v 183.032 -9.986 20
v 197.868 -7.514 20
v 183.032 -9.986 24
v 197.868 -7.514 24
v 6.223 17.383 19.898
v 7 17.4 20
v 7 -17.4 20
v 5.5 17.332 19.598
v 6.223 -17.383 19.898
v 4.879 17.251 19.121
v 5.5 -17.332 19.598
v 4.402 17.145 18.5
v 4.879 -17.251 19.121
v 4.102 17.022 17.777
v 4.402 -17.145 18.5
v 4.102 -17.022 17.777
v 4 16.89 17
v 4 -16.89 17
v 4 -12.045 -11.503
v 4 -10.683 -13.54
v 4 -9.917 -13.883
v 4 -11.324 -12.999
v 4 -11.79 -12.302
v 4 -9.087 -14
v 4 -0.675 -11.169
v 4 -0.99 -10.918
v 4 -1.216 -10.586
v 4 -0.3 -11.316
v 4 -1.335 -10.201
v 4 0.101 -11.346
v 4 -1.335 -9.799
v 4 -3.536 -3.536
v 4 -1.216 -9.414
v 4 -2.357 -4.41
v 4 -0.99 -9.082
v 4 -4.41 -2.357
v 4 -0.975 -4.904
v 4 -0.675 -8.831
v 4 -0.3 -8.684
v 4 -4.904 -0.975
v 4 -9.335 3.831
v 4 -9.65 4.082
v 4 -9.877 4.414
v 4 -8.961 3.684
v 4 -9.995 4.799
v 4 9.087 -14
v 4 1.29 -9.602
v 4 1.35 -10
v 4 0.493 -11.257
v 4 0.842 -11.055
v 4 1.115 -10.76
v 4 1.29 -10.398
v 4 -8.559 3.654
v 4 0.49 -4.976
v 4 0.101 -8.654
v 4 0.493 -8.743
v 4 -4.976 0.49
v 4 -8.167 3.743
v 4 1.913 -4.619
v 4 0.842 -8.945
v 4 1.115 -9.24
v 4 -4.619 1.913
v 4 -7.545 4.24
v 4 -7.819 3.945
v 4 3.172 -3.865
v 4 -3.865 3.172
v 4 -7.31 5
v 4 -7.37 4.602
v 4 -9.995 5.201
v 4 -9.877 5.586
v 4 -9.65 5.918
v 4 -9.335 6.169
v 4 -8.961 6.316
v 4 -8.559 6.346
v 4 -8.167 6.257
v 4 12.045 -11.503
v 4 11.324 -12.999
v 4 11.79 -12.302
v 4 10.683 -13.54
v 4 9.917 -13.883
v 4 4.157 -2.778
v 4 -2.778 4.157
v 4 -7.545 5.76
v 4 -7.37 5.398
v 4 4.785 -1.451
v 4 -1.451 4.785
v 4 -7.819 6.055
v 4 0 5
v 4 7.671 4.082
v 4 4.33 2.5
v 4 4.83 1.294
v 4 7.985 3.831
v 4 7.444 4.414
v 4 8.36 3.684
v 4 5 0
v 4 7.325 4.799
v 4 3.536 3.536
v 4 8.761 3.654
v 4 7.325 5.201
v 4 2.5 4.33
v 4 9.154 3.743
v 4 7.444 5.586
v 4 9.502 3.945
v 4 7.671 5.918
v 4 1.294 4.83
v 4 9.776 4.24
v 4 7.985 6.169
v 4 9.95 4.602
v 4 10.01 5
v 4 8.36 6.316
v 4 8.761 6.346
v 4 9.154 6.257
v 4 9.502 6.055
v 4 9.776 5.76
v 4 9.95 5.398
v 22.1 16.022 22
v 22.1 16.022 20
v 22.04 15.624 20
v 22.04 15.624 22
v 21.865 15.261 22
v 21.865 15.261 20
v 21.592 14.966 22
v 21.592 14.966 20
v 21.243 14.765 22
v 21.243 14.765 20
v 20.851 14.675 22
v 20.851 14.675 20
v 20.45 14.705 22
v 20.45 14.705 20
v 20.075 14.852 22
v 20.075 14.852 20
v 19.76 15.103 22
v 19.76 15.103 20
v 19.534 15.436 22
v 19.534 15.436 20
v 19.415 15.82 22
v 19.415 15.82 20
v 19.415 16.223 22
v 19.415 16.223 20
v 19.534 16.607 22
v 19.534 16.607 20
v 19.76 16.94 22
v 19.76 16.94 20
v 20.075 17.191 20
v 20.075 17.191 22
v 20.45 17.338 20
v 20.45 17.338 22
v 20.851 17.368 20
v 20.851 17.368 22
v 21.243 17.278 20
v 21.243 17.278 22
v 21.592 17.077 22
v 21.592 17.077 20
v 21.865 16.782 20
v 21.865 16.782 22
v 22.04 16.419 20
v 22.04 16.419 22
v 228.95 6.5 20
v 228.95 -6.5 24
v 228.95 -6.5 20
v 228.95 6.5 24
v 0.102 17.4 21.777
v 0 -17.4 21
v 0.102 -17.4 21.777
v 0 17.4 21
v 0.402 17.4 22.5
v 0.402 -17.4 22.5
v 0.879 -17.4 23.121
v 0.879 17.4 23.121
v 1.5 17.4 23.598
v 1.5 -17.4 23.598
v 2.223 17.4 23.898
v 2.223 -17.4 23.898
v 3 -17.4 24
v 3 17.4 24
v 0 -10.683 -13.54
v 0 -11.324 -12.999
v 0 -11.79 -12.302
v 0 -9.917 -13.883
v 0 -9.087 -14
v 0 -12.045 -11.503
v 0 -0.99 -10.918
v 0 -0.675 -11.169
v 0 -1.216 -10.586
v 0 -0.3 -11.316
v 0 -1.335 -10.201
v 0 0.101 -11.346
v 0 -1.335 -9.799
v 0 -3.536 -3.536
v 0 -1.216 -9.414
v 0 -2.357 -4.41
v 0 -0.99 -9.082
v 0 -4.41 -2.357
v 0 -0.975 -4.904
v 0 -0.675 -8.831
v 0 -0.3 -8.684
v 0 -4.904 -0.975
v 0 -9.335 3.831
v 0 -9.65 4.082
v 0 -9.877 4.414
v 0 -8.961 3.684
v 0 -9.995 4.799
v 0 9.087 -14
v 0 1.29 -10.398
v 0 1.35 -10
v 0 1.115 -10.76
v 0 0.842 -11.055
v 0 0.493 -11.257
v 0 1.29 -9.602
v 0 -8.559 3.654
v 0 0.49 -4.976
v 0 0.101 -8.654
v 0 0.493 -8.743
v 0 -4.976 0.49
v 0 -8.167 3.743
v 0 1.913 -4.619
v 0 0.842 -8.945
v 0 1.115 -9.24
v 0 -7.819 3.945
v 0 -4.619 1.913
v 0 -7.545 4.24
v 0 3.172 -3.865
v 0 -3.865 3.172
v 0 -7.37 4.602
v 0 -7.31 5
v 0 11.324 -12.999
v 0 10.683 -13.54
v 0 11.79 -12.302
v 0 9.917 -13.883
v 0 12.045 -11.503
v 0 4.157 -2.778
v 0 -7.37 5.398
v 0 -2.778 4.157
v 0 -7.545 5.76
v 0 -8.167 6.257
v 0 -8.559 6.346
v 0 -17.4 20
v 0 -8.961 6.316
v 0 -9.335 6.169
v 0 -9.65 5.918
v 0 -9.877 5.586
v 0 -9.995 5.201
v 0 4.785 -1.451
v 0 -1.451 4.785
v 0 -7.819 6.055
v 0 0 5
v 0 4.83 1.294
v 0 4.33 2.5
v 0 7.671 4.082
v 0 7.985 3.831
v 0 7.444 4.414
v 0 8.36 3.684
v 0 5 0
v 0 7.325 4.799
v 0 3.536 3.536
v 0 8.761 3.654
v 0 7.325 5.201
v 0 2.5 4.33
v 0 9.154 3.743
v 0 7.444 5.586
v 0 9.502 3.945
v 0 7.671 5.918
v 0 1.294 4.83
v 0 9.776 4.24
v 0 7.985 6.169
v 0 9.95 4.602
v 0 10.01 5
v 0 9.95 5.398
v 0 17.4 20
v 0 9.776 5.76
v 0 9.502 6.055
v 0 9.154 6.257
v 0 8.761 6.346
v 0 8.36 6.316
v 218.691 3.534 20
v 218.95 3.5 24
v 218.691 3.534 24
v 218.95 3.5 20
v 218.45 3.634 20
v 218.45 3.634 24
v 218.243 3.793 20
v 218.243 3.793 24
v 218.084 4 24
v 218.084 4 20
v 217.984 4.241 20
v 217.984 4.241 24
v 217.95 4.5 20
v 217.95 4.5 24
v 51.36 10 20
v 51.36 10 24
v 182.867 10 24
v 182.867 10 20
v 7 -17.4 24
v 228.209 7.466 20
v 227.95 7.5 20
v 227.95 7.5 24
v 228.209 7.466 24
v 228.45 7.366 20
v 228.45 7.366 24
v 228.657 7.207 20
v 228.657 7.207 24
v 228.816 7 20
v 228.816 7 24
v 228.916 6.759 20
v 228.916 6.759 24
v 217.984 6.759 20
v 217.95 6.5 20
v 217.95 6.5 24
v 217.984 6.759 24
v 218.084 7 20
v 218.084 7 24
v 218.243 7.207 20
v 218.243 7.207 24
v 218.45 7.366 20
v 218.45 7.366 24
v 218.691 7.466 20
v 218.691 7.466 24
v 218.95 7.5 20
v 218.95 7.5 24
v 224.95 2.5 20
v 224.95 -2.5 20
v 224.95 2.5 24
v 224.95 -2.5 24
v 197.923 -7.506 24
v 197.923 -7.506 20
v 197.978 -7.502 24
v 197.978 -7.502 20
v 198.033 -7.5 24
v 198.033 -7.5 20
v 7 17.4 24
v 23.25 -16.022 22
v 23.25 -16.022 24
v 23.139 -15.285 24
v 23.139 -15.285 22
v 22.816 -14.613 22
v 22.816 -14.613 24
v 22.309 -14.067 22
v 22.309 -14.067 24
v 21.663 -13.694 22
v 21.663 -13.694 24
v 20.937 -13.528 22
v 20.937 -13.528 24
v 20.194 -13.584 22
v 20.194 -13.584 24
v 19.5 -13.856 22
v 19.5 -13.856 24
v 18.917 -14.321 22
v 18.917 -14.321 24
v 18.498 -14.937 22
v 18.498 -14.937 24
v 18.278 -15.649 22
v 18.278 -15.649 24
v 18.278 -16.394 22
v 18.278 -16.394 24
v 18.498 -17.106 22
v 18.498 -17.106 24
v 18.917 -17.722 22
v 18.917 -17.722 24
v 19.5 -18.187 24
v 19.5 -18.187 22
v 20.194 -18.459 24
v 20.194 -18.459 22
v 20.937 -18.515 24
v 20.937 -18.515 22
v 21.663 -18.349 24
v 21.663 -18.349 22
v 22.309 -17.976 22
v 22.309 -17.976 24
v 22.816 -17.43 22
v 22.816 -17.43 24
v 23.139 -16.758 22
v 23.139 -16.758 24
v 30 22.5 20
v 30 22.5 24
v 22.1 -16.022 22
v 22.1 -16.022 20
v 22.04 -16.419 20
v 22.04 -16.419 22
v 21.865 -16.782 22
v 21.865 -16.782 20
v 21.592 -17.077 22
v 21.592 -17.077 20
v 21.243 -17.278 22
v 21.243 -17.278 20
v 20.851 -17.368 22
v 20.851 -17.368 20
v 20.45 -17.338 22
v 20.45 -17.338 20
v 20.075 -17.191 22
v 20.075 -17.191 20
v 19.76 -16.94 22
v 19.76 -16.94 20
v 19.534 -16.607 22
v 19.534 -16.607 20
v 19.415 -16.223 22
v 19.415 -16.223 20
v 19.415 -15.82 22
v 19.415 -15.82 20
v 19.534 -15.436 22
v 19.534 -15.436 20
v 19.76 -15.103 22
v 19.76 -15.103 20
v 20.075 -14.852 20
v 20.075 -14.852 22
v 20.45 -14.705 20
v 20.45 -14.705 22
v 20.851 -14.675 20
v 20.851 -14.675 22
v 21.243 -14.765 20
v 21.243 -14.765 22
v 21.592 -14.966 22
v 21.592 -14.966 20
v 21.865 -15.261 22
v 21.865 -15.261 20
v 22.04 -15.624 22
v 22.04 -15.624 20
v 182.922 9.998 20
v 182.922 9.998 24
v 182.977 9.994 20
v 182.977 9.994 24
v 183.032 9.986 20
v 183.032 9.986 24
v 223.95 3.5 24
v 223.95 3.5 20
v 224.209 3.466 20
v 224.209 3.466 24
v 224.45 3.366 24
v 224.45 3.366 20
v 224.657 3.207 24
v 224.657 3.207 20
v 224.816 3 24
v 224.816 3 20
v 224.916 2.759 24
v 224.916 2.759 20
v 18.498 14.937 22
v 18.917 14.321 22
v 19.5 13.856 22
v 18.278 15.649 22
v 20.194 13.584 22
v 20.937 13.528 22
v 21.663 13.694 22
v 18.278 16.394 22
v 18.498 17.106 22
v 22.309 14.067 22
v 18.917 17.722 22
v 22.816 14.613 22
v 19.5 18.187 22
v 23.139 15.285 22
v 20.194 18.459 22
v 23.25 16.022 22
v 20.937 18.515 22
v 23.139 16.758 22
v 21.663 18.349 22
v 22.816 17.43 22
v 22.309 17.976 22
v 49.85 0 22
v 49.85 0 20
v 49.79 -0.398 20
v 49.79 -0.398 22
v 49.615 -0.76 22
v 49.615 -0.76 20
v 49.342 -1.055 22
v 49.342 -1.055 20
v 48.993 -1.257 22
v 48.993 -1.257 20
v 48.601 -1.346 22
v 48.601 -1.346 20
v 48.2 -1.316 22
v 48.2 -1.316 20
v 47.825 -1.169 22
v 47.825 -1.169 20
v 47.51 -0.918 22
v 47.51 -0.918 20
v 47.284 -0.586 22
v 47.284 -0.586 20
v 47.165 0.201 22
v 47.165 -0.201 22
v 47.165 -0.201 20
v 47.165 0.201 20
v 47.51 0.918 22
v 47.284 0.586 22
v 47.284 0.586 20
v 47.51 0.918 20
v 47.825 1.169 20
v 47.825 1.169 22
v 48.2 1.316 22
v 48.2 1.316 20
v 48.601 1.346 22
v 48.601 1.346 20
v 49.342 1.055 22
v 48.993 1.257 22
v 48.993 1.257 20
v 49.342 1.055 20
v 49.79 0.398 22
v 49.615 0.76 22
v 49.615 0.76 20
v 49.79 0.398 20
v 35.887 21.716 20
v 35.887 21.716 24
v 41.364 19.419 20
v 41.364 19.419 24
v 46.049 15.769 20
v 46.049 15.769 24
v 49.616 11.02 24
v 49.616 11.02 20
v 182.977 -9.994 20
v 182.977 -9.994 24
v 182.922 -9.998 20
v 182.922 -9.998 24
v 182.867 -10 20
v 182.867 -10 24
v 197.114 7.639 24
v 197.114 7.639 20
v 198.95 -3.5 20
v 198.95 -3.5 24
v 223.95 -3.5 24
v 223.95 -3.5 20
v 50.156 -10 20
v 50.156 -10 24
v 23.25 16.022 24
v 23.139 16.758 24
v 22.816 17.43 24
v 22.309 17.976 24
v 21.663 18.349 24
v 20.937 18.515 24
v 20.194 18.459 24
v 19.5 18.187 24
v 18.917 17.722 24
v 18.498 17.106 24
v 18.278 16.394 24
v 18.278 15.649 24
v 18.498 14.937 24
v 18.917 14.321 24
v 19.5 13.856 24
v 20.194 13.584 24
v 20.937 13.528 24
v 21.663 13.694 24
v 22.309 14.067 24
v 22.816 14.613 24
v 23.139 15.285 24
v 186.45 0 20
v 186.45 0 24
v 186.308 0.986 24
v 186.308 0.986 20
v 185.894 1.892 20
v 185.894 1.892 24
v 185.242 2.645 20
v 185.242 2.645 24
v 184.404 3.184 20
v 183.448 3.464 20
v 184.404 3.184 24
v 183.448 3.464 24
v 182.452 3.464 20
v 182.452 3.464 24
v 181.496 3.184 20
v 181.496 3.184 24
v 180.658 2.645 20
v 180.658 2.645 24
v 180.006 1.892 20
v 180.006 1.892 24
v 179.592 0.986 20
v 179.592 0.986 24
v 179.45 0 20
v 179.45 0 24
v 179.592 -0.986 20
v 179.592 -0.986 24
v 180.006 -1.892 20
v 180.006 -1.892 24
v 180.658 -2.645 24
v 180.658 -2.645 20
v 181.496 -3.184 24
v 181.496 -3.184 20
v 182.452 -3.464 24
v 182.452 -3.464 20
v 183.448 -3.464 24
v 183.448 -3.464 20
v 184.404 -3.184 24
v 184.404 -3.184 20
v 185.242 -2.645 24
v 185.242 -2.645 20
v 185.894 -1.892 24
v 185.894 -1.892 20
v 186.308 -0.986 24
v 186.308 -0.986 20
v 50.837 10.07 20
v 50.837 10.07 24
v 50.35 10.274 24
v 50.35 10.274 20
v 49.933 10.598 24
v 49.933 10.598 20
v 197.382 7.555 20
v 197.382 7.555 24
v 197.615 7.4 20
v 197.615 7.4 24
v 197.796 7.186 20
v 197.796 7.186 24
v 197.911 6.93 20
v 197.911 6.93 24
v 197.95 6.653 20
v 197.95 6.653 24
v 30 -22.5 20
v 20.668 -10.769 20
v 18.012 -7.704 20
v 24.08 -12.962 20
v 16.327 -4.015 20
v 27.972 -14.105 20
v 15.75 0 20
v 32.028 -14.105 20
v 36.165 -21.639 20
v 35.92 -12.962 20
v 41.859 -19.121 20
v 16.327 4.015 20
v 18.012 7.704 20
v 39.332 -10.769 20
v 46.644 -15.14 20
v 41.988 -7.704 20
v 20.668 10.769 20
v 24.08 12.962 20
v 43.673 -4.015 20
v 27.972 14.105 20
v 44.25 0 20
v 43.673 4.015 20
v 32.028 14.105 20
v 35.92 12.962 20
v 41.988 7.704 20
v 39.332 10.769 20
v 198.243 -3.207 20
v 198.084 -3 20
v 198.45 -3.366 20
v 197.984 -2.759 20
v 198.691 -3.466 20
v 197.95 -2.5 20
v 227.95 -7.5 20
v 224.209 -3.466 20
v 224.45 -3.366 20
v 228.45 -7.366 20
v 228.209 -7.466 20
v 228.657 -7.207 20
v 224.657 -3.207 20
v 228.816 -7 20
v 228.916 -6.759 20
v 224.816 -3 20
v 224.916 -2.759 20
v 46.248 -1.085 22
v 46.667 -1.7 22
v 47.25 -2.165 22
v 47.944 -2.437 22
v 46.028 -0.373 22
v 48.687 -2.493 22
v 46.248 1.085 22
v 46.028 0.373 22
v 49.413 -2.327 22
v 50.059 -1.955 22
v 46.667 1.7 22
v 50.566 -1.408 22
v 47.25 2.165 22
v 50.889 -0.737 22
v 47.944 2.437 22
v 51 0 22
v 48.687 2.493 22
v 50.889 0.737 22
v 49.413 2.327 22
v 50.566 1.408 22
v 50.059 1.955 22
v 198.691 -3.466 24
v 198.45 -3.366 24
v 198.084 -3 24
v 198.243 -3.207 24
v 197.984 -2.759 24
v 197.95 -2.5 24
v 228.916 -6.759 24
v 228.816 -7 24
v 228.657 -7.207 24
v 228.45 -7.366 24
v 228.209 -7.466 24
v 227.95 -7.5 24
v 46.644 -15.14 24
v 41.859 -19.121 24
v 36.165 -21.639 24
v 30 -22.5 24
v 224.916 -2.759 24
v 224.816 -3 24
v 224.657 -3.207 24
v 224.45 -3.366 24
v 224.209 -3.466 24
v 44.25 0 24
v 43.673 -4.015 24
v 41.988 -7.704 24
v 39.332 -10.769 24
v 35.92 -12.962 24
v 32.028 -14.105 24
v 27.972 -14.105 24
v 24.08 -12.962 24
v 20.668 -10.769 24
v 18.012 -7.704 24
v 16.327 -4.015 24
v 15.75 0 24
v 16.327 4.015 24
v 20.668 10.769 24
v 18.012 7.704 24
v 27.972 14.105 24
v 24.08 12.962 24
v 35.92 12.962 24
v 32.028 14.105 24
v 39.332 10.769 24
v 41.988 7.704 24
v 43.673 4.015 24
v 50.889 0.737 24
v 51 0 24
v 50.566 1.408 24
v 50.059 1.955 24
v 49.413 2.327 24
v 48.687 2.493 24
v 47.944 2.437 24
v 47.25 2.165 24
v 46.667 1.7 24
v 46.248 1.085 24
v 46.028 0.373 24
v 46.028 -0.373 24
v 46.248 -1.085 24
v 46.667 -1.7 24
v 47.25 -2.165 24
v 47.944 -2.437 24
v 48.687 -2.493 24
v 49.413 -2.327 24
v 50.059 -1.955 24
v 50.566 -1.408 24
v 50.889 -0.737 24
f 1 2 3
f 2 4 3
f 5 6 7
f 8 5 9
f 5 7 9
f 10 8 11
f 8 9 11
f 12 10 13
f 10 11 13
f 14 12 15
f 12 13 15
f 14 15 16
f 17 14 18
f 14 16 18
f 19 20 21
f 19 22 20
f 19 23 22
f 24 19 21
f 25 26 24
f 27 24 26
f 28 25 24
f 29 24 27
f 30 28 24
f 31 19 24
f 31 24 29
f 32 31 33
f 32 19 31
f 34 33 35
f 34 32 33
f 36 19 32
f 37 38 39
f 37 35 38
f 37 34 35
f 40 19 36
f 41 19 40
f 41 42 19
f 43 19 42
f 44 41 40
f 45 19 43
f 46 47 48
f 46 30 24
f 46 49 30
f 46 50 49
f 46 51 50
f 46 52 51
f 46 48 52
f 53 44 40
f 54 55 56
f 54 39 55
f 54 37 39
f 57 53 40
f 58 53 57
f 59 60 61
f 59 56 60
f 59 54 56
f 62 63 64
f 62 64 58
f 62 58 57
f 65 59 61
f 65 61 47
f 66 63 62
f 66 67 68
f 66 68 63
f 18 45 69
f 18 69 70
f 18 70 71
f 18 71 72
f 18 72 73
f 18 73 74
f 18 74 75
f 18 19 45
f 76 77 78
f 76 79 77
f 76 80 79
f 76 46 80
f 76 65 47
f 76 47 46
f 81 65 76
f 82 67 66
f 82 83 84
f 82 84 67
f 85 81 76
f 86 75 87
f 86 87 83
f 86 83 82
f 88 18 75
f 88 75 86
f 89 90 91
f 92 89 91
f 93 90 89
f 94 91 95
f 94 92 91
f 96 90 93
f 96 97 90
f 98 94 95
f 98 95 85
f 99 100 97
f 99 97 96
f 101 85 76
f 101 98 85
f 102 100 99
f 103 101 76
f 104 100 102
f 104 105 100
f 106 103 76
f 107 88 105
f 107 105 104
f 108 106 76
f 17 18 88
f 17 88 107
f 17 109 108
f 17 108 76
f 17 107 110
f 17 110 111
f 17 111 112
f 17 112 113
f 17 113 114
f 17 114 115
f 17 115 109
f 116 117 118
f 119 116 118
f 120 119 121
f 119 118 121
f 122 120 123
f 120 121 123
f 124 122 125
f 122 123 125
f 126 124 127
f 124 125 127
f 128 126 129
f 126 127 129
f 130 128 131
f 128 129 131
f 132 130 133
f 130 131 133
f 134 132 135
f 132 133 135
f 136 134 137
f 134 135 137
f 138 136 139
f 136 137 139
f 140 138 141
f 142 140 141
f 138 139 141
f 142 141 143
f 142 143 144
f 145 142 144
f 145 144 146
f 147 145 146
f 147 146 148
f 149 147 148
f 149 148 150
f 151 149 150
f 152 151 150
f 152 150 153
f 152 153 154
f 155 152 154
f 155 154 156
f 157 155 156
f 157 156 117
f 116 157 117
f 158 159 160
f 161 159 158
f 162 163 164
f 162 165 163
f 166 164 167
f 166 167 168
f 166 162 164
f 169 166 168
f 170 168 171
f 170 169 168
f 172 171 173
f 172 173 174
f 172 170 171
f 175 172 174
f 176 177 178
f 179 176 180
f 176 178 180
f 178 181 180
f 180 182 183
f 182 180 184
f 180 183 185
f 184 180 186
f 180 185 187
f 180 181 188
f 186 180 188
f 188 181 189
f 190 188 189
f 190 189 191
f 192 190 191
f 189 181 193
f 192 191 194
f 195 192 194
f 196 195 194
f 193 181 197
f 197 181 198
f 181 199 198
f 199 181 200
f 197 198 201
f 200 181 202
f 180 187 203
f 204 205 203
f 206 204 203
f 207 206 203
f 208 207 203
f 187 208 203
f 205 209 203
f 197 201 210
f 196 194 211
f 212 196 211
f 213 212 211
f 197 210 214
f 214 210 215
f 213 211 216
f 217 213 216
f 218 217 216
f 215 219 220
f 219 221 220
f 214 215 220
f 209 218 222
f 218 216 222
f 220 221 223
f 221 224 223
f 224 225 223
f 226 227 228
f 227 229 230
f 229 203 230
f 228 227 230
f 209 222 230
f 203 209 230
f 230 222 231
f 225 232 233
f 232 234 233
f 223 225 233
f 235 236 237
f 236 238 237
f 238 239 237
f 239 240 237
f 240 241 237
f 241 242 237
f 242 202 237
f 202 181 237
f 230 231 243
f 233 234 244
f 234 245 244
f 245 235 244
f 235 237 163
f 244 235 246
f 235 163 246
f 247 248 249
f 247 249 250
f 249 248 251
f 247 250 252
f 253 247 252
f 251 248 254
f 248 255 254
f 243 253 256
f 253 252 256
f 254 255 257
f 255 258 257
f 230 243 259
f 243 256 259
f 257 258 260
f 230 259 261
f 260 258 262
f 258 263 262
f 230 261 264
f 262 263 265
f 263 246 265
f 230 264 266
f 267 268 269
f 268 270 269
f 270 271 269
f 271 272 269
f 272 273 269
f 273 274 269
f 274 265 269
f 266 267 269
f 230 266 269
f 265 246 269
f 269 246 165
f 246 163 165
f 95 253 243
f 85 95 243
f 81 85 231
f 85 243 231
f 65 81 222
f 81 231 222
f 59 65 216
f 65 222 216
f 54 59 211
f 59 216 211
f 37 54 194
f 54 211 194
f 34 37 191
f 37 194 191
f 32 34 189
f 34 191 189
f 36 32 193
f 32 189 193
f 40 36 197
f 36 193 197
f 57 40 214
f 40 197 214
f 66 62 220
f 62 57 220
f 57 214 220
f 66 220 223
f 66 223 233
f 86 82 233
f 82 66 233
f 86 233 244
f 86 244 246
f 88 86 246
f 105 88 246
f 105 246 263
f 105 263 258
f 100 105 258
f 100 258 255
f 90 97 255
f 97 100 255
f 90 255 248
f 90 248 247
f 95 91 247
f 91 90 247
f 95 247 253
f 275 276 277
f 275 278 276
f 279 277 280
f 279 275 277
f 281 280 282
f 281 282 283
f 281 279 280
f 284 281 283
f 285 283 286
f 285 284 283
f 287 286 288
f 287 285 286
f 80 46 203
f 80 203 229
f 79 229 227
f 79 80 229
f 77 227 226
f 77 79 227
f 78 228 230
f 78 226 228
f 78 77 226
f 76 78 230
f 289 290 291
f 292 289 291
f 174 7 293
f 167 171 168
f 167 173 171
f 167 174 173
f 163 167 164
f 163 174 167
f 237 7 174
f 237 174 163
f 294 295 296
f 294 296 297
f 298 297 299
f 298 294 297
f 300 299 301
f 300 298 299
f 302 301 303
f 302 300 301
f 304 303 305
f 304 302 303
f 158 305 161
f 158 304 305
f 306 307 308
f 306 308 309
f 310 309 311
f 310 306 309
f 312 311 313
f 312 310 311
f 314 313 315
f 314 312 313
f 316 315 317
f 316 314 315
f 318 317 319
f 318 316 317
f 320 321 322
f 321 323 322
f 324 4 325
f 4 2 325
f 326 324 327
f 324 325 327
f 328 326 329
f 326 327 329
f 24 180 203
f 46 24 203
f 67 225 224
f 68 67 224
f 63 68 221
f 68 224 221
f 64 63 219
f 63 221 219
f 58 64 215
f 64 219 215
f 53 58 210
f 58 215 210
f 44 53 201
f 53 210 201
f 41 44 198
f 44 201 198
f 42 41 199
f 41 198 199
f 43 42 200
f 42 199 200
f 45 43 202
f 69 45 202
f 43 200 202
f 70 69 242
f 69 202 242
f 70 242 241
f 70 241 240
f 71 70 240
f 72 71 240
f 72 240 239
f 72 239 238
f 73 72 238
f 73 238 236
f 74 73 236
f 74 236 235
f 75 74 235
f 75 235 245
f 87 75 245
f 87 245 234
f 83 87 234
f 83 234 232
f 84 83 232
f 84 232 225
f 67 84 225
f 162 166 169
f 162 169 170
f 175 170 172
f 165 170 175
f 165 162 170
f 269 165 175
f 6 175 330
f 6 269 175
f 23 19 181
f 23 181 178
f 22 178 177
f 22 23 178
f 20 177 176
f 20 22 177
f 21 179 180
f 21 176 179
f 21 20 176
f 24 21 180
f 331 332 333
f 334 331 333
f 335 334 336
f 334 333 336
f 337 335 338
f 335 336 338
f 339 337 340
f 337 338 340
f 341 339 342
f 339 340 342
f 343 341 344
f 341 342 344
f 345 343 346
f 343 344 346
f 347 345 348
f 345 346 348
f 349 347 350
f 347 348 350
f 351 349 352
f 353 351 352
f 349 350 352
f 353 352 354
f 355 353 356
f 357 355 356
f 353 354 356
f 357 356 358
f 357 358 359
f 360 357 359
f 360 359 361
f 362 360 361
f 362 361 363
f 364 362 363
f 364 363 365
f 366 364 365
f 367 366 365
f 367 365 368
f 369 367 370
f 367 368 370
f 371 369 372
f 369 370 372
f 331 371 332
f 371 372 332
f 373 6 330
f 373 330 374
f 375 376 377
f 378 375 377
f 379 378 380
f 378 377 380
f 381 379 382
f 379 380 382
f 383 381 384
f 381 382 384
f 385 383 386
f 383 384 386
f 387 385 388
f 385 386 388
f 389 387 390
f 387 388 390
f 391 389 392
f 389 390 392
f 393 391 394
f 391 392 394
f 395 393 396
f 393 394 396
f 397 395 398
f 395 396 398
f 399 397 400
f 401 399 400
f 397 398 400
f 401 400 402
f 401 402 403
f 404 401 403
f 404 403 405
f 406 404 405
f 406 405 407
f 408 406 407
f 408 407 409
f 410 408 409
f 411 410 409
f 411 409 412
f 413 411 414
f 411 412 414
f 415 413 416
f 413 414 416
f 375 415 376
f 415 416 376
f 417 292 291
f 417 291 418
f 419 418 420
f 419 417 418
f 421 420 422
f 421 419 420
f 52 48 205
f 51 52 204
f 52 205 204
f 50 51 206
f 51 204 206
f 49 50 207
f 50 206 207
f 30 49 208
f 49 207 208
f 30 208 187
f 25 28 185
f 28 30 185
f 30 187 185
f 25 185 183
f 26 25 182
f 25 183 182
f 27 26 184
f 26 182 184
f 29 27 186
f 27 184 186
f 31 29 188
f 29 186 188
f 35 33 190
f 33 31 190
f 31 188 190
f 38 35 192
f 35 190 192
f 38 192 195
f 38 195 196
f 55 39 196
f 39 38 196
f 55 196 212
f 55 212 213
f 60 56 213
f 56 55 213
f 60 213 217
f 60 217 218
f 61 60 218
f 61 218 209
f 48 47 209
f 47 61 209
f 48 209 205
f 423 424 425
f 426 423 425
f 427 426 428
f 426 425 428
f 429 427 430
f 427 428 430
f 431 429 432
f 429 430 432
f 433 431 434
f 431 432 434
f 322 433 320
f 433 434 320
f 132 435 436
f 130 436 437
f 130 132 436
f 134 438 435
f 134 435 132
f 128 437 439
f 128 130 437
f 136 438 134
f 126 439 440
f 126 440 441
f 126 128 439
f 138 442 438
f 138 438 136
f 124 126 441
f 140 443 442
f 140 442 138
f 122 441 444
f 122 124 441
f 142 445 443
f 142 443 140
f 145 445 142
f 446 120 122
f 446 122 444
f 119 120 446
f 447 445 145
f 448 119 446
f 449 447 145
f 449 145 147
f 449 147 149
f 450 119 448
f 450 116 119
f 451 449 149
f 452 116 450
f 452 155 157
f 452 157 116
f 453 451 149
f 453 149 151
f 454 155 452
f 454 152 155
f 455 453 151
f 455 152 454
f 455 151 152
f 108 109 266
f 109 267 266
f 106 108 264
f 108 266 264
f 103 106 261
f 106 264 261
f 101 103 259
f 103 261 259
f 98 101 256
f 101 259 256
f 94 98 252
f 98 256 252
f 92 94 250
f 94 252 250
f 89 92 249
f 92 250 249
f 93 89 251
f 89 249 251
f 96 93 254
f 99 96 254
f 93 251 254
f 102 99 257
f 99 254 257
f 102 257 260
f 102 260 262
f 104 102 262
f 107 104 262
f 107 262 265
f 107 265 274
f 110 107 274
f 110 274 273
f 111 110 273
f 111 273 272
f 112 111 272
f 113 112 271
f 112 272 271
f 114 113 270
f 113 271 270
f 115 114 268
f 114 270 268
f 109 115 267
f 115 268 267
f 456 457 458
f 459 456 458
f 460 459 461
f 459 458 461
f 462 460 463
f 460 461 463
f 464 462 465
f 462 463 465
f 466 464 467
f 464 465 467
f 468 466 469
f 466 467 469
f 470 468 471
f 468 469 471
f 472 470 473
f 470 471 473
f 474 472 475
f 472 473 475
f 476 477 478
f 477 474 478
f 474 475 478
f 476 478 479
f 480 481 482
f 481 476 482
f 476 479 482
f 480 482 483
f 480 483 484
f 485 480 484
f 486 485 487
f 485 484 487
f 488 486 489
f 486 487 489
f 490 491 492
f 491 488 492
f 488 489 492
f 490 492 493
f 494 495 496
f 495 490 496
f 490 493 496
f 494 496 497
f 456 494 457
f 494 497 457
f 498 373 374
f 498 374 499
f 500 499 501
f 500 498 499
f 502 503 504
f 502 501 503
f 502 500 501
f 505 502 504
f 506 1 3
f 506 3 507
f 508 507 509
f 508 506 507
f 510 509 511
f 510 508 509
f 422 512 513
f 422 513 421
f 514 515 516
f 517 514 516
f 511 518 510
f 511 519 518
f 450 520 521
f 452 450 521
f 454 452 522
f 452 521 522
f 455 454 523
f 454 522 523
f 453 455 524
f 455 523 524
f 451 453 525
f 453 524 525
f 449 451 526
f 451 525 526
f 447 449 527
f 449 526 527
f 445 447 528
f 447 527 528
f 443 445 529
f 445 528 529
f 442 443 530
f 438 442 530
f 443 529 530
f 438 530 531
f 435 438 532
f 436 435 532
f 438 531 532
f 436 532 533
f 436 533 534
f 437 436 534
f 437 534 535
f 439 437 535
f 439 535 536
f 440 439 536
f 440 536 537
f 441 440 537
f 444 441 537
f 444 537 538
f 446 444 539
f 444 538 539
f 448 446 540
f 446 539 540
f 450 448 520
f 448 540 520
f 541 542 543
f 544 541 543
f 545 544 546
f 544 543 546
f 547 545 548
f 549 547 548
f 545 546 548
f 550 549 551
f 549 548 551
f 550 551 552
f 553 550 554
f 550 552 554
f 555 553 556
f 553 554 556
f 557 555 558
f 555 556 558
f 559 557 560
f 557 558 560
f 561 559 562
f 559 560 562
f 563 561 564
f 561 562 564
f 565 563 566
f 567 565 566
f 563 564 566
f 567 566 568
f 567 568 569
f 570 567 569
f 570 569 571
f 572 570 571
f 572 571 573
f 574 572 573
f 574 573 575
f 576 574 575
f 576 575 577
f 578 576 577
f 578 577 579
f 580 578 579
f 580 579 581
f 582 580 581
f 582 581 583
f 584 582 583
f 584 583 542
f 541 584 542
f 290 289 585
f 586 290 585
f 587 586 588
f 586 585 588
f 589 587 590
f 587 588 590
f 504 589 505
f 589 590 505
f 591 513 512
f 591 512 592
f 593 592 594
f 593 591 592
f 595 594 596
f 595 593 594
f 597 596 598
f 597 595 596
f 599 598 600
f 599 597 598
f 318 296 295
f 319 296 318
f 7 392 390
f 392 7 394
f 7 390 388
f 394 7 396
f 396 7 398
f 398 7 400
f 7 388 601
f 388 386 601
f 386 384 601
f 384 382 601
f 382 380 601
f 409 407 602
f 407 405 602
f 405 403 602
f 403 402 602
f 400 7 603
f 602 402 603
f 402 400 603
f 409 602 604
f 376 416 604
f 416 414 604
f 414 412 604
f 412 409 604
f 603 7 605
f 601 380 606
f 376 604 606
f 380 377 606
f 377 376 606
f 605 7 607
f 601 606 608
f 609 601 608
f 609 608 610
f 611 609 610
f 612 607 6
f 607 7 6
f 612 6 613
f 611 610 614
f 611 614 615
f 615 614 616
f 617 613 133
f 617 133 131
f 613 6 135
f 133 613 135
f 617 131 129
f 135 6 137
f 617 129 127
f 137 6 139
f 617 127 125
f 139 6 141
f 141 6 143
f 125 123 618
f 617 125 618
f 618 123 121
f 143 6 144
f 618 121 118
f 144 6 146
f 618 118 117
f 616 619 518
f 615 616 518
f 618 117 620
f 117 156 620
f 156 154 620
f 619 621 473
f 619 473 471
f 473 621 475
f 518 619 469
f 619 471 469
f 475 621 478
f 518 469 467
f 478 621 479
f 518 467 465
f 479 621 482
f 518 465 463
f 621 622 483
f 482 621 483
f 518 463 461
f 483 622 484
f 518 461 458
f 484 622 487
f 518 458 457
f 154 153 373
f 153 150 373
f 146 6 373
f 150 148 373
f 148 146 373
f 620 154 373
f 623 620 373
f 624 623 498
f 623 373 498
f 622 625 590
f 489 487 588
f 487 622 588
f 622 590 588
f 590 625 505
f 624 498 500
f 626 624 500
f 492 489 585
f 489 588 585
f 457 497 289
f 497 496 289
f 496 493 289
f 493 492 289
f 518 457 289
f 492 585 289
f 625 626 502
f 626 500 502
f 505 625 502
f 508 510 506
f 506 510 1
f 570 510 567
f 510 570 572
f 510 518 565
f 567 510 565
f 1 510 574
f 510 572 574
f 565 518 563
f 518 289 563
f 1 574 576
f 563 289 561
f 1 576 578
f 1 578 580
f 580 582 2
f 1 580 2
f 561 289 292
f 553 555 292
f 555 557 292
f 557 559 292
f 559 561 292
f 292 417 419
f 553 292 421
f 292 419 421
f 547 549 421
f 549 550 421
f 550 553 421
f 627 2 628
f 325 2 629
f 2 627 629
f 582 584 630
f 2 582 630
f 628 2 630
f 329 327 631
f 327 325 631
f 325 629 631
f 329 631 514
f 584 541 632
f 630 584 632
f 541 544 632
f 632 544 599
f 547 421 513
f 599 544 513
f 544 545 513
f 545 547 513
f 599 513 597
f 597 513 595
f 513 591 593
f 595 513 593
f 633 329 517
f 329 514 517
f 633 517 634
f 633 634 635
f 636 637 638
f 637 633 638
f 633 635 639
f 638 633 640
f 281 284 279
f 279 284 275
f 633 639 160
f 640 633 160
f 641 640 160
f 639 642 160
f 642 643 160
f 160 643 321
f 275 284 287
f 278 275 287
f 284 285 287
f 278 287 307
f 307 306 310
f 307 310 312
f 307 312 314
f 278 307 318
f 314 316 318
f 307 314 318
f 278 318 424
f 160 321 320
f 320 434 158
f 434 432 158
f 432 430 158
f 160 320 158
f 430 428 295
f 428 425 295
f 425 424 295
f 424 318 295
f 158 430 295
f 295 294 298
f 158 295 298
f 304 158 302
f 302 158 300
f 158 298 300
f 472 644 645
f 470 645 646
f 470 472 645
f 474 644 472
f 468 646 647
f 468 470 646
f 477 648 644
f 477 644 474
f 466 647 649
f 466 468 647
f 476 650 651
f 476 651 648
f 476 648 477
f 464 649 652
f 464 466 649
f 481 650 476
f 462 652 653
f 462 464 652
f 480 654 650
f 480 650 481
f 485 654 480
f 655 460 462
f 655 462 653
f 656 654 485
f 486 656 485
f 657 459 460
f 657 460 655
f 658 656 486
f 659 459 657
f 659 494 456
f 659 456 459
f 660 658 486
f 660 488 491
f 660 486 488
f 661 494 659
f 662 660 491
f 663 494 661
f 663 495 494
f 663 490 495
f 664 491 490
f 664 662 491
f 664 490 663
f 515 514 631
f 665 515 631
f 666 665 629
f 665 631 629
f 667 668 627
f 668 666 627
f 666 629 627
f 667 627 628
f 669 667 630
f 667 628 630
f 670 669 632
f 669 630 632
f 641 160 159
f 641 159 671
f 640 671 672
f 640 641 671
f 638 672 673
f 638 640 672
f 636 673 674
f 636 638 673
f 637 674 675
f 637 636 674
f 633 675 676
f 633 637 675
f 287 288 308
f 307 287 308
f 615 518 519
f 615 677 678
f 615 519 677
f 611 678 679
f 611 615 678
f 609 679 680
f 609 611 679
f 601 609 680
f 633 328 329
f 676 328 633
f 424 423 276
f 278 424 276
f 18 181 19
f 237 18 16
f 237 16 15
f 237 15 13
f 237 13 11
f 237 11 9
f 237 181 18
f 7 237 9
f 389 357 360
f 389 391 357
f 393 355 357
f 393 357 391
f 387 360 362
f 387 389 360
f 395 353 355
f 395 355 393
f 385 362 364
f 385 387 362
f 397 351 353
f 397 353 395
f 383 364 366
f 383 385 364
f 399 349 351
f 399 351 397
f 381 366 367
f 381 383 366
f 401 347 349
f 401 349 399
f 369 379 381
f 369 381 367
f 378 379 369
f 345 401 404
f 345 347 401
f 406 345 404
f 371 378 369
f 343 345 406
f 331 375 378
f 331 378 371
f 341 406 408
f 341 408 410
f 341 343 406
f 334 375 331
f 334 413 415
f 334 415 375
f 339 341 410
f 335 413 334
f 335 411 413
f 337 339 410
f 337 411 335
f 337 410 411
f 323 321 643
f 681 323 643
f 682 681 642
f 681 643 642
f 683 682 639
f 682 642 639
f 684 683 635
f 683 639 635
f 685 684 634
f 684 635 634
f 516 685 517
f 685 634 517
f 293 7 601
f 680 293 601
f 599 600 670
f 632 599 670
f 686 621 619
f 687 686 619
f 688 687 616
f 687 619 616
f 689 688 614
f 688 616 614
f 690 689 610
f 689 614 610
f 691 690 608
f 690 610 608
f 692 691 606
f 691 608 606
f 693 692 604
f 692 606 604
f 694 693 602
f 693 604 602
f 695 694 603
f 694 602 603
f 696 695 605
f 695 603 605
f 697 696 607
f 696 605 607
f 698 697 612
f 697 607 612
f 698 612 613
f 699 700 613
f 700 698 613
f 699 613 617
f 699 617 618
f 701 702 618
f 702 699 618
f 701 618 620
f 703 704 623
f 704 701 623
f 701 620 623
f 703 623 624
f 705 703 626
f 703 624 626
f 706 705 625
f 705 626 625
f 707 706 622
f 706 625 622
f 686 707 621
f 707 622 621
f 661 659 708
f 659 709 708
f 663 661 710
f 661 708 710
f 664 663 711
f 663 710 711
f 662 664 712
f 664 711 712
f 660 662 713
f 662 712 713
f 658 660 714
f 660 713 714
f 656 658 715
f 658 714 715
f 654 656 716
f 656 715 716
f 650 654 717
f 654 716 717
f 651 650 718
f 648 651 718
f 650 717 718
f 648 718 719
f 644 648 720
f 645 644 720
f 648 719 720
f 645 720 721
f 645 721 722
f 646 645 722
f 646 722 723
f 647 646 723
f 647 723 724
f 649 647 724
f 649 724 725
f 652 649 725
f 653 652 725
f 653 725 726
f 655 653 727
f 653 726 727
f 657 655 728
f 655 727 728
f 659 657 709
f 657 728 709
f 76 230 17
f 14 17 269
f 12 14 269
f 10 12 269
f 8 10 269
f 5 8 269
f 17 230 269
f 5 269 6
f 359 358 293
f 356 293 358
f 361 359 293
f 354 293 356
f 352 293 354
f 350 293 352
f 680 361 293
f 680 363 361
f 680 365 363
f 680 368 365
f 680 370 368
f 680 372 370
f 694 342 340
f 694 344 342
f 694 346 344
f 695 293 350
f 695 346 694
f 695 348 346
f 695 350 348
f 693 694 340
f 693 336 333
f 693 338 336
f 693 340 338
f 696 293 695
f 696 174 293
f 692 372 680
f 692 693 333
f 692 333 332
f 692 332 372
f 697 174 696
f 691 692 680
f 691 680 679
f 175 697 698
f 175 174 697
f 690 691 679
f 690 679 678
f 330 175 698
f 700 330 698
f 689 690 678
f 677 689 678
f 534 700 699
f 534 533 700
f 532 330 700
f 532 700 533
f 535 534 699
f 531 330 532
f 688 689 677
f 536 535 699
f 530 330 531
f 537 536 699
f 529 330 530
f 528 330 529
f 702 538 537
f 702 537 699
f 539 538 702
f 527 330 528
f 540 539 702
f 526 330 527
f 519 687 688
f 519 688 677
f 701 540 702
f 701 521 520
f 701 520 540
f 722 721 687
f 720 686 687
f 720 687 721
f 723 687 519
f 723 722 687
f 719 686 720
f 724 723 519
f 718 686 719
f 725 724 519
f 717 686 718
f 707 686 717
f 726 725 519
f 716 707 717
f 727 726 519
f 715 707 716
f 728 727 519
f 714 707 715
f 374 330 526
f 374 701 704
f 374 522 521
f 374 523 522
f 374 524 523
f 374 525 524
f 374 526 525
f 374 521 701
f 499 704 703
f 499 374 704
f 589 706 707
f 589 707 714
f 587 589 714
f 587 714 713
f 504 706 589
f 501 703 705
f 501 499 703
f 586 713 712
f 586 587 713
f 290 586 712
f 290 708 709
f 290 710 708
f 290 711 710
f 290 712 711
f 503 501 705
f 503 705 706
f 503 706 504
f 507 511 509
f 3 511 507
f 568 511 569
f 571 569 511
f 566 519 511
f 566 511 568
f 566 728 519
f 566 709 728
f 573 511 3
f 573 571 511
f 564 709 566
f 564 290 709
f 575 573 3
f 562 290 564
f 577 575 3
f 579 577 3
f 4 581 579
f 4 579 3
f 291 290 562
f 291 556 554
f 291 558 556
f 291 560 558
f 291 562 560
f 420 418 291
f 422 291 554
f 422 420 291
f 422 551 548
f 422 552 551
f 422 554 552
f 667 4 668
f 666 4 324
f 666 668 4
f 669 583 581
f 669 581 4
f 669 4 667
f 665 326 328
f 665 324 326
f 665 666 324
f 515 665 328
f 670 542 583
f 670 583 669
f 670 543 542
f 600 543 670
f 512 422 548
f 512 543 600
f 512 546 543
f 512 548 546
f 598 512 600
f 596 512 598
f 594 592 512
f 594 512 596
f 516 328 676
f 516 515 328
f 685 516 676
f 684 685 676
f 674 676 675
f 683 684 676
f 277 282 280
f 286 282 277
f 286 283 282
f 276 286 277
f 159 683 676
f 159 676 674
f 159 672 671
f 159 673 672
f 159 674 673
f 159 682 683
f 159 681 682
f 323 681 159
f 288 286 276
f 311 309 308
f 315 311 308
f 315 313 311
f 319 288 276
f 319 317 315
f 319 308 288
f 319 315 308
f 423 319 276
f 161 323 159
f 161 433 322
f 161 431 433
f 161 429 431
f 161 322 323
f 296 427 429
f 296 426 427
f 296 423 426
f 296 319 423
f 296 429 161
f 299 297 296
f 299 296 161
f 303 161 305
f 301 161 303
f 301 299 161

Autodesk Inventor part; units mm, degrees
ref_plane "YZ Plane" through (0, 0, 0) normal (1, 0, 0) x (0, 1, 0)
ref_plane "XZ Plane" through (0, 0, 0) normal (0, 1, 0) x (-1, 0, 0)
ref_plane "XY Plane" through (0, 0, 0) normal (0, 0, 1) x (1, 0, 0)
sketch "スケッチ1" plane through (0, 0, 0) normal (1, 0, 0) x (0, 1, 0)
  circle A0 centre (0, 0) radius 10
  circle A1 centre (0, -10) radius 1.35
  circle A2 centre (8.6603, 5) radius 1.35
  circle A3 centre (-8.6603, 5) radius 1.35
  circle A4 centre (0, 0) radius 5
  line L0 (0, 0) -> (0, 50)
  circle A5 centre (0, 50) radius 22.5
  circle A6 centre (0, 0) radius 14
  line L1 (-14, 0) -> (-22.5, 50)
  line L2 (14, 0) -> (22.5, 50)
  line L3 (0, -14) -> (-11.62, -14)
  line L4 (-11.62, -14) -> (-14, 0)
  line L5 (0, -14) -> (11.62, -14)
  line L6 (11.62, -14) -> (14, 0)
  line L7 (0, 20) -> (-17.4, 20)
  line L8 (0, 20) -> (17.4, 20)
  dimension "d0" = 20
  dimension "d1" = 2.7
  dimension "d4" = 360
  dimension "d6" = 10
  dimension "d7" = 50
  dimension "d8" = 45
  dimension "d9" = 28
extrude "押し出し1" add sketch "スケッチ1" along normal blind 4 contours A0 A1 A3 A2 | A6 L6 L4 | A6 L1 L7 L0 | L0 L8 L2 A6 | L6 L5 A6 | A6 L3 L4
sketch "スケッチ2" plane through (0, -17.4, 20) normal (0, 0, 1) x (1, 0, 0)
  line L0 (0, 17.4) -> (30, 17.4)
  circle A0 centre (30, 17.4) radius 22.5
  circle A1 centre (30, 17.4) radius 18.5
  circle A2 centre (30, 17.4) radius 14.25
  circle A3 centre (48.5, 17.4) radius 1.35
  circle A4 centre (20.75, 33.4215) radius 1.35
  circle A5 centre (20.75, 1.3785) radius 1.35
  line L1 (0, 29.02) -> (0, 34.8) projected
  line L2 (0, 0) -> (0, 5.78) projected
  line L3 (0, 34.8) -> (0, 0)
  line L4 (4, 29.02) -> (4, 34.8) projected
  line L5 (4, 34.8) -> (7, 34.8)
  line L6 (7, 34.8) -> (30, 39.9)
  line L7 (4, 0) -> (4, 5.78) projected
  line L8 (4, 0) -> (7, 0)
  line L9 (7, 0) -> (30, -5.1)
  line L10 (4, 0) -> (0, 0)
  line L11 (0, 34.8) -> (4, 34.8) projected
  line L12 (0, 0) -> (0, 34.8)
  line L13 (0, 34.8) -> (4, 34.8)
  dimension "d14" = 37
  dimension "d12" = 30
  dimension "d13" = 45
  dimension "d15" = 28.5
  dimension "d16" = 2.7
  dimension "d19" = 360
  dimension "d21" = 3
  dimension "d22" = 3
extrude "押し出し2" add sketch "スケッチ2" along normal blind 4 contours L3 L1 L11 L5 L6 A0 L0 | L0 A0 L9 L8 L10 L2 L3 | A1 A4 A3 A5 | A0 L6 L9
fillet "フィレット1" radius 3 2 edges at (4, 0, 20) (0, 0, 24)
fillet "フィレット2" radius 3 2 edges at (2, -11.62, -14) (2, 11.62, -14)
sketch "スケッチ7" plane through (0, -17.4, 24) normal (0, 0, 1) x (1, 0, 0)
  circle A0 centre (30, 17.4) radius 14.25 projected
  line L0 (30, 17.4) -> (182.95, 17.4)
  line L1 (30, 17.4) -> (182.95, 17.4) construction
  circle A1 centre (182.95, 17.4) radius 3.5
  circle A2 centre (182.95, 17.4) radius 10
  line L2 (182.95, 27.4) -> (50.1556, 27.4)
  arc A3 (30, -5.1) -> (30, 39.9) centre (30, 17.4) ccw projected
  line L3 (182.95, 27.4) -> (315.7444, 27.4) construction
  line L4 (182.95, 7.4) -> (50.1556, 7.4)
  point P0 (0, 17.4)
  dimension "d55" = 152.95
  dimension "d56" = 0
  dimension "d57" = 7
  dimension "d58" = 20
  dimension "d59" = 180
extrude "押し出し7" add sketch "スケッチ7" against normal blind 4 contours A3 L2 A2 L0 | L0 A2 L4 A3 | A2
sketch "スケッチ8" plane through (0, -17.4, 24) normal (0, 0, 1) x (1, 0, 0)
  circle A0 centre (20.75, 33.4215) radius 1.35 projected
  circle A1 centre (20.75, 33.4215) radius 2.5
  circle A2 centre (48.5, 17.4) radius 1.35 projected
  circle A3 centre (48.5, 17.4) radius 2.5
  circle A4 centre (20.75, 1.3785) radius 1.35 projected
  circle A5 centre (20.75, 1.3785) radius 2.5
  point P0 (0, 17.4)
  dimension "d63" = 5
  dimension "d64" = 5
  dimension "d65" = 5
extrude "押し出し8" cut sketch "スケッチ8" against normal blind 2 contours A0 | A1 | A3 | A4 | A5
fillet "フィレット4" radius 2 1 edges at (50.1556, 10, 22)
sketch "スケッチ12" plane through (0, -17.4, 24) normal (0, 0, 1) x (1, 0, 0)
  circle A0 centre (48.5, 17.4) radius 2.5 projected
  circle A1 centre (20.75, 1.3785) radius 2.5 projected
  circle A2 centre (20.75, 33.4215) radius 2.5 projected
  circle A3 centre (182.95, 17.4) radius 3.5 projected
  line L0 (3, 0) -> (3, 34.8) projected
  line L1 (3, 0) -> (7, 0) projected
  line L2 (7, 0) -> (30, -5.1) projected
  arc A4 (30, -5.1) -> (50.1556, 7.4) centre (30, 17.4) ccw projected
  line L3 (50.1556, 7.4) -> (182.95, 7.4) projected
  arc A5 (182.95, 7.4) -> (182.95, 27.4) centre (182.95, 17.4) ccw projected
  line L4 (182.95, 27.4) -> (51.36, 27.4) projected
  arc A6 (49.6163, 28.4204) -> (51.36, 27.4) centre (51.36, 29.4) ccw projected
  arc A7 (49.6163, 28.4204) -> (30, 39.9) centre (30, 17.4) ccw projected
  line L5 (30, 39.9) -> (7, 34.8) projected
  line L6 (7, 34.8) -> (3, 34.8) projected
  circle A8 centre (30, 17.4) radius 14.25 projected
  line L7 (182.95, 7.4) -> (232.95, 7.4)
  line L8 (182.95, 27.4) -> (232.95, 27.4)
  line L9 (232.95, 27.4) -> (232.95, 7.4)
  point P0 (0, 17.4)
  dimension "d92" = 50
  dimension "d93" = 50
extrude "押し出し12" add sketch "スケッチ12" against normal blind 4 contours A5 L8 L9 L7
sketch "スケッチ13" plane through (0, -17.4, 24) normal (0, 0, 1) x (1, 0, 0)
  circle A0 centre (48.5, 17.4) radius 2.5 projected
  circle A1 centre (20.75, 1.3785) radius 2.5 projected
  circle A2 centre (20.75, 33.4215) radius 2.5 projected
  circle A3 centre (182.95, 17.4) radius 3.5 projected
  line L0 (3, 0) -> (3, 34.8) projected
  line L1 (3, 0) -> (7, 0) projected
  line L2 (7, 0) -> (30, -5.1) projected
  arc A4 (30, -5.1) -> (50.1556, 7.4) centre (30, 17.4) ccw projected
  line L3 (50.1556, 7.4) -> (232.95, 7.4) projected
  line L4 (232.95, 7.4) -> (232.95, 27.4) projected
  line L5 (232.95, 27.4) -> (51.36, 27.4) projected
  arc A5 (49.6163, 28.4204) -> (51.36, 27.4) centre (51.36, 29.4) ccw projected
  arc A6 (49.6163, 28.4204) -> (30, 39.9) centre (30, 17.4) ccw projected
  line L6 (30, 39.9) -> (7, 34.8) projected
  line L7 (7, 34.8) -> (3, 34.8) projected
  circle A7 centre (30, 17.4) radius 14.25 projected
  line L8 (197.95, 24.9) -> (182.95, 27.4)
  line L9 (197.95, 9.9) -> (182.95, 7.4)
  line L10 (197.95, 9.9) -> (228.95, 9.9)
  line L11 (228.95, 9.9) -> (228.95, 24.9)
  line L12 (228.95, 24.9) -> (197.95, 24.9)
  point P0 (0, 17.4)
  dimension "d96" = 2.5
  dimension "d97" = 15
  dimension "d98" = 35
  dimension "d99" = 35
  dimension "d100" = 31
  dimension "d101" = 15
  dimension "d102" = 31
extrude "押し出し13" cut sketch "スケッチ13" against normal blind 4 contours L9 L10 L11 L12 L8 L5 L4 L3
sketch "スケッチ14" plane through (0, -17.4, 24) normal (0, 0, 1) x (1, 0, 0)
  circle A0 centre (30, 17.4) radius 14.25 projected
  line L0 (182.95, 7.4) -> (197.95, 9.9) projected
  line L1 (197.95, 9.9) -> (228.95, 9.9) projected
  line L2 (228.95, 9.9) -> (228.95, 24.9) projected
  line L3 (228.95, 24.9) -> (197.95, 24.9) projected
  line L4 (197.95, 24.9) -> (182.95, 27.4) projected
  line L5 (182.95, 27.4) -> (51.36, 27.4) projected
  arc A1 (49.6163, 28.4204) -> (51.36, 27.4) centre (51.36, 29.4) ccw projected
  arc A2 (49.6163, 28.4204) -> (30, 39.9) centre (30, 17.4) ccw projected
  line L6 (30, 39.9) -> (7, 34.8) projected
  line L7 (7, 34.8) -> (3, 34.8) projected
  line L8 (3, 0) -> (3, 34.8) projected
  line L9 (3, 0) -> (7, 0) projected
  line L10 (7, 0) -> (30, -5.1) projected
  arc A3 (30, -5.1) -> (50.1556, 7.4) centre (30, 17.4) ccw projected
  line L11 (50.1556, 7.4) -> (182.95, 7.4) projected
  circle A4 centre (182.95, 17.4) radius 3.5 projected
  circle A5 centre (20.75, 33.4215) radius 2.5 projected
  circle A6 centre (20.75, 1.3785) radius 2.5 projected
  circle A7 centre (48.5, 17.4) radius 2.5 projected
  line L12 (197.95, 24.9) -> (197.95, 13.9)
  line L13 (197.95, 13.9) -> (224.95, 13.9)
  line L14 (224.95, 13.9) -> (224.95, 20.9)
  line L15 (224.95, 20.9) -> (217.95, 20.9)
  line L16 (217.95, 20.9) -> (217.95, 24.9)
  point P0 (0, 17.4)
  dimension "d105" = 4
  dimension "d106" = 4
  dimension "d107" = 4
  dimension "d108" = 4
  dimension "d109" = 4
  dimension "d110" = 7
  dimension "d113" = 27
  dimension "d114" = 4
extrude "押し出し14" cut sketch "スケッチ14" against normal blind 4 contours L16 L15 L14 L13 L12 L3
fillet "フィレット7" radius 1 11 edges at (197.95, -7.5, 22) (182.95, -10, 22) (228.95, -7.5, 22) (217.95, 3.5, 22) (224.95, 3.5, 22) (217.95, 7.5, 22) (228.95, 7.5, 22) (182.95, 10, 22) (197.95, 7.5, 22) (197.95, -3.5, 22) (224.95, -3.5, 22)
equation "\"d99\" = d98"
equation "\"d102\" = d100"
equation "\"d106\" = d105"
equation "\"d107\" = d105"
equation "\"d108\" = d105"
equation "\"d109\" = d105"
equation "\"d114\" = d105"
properties part number "motor_holder_8-4" material "ABS プラスチック"
